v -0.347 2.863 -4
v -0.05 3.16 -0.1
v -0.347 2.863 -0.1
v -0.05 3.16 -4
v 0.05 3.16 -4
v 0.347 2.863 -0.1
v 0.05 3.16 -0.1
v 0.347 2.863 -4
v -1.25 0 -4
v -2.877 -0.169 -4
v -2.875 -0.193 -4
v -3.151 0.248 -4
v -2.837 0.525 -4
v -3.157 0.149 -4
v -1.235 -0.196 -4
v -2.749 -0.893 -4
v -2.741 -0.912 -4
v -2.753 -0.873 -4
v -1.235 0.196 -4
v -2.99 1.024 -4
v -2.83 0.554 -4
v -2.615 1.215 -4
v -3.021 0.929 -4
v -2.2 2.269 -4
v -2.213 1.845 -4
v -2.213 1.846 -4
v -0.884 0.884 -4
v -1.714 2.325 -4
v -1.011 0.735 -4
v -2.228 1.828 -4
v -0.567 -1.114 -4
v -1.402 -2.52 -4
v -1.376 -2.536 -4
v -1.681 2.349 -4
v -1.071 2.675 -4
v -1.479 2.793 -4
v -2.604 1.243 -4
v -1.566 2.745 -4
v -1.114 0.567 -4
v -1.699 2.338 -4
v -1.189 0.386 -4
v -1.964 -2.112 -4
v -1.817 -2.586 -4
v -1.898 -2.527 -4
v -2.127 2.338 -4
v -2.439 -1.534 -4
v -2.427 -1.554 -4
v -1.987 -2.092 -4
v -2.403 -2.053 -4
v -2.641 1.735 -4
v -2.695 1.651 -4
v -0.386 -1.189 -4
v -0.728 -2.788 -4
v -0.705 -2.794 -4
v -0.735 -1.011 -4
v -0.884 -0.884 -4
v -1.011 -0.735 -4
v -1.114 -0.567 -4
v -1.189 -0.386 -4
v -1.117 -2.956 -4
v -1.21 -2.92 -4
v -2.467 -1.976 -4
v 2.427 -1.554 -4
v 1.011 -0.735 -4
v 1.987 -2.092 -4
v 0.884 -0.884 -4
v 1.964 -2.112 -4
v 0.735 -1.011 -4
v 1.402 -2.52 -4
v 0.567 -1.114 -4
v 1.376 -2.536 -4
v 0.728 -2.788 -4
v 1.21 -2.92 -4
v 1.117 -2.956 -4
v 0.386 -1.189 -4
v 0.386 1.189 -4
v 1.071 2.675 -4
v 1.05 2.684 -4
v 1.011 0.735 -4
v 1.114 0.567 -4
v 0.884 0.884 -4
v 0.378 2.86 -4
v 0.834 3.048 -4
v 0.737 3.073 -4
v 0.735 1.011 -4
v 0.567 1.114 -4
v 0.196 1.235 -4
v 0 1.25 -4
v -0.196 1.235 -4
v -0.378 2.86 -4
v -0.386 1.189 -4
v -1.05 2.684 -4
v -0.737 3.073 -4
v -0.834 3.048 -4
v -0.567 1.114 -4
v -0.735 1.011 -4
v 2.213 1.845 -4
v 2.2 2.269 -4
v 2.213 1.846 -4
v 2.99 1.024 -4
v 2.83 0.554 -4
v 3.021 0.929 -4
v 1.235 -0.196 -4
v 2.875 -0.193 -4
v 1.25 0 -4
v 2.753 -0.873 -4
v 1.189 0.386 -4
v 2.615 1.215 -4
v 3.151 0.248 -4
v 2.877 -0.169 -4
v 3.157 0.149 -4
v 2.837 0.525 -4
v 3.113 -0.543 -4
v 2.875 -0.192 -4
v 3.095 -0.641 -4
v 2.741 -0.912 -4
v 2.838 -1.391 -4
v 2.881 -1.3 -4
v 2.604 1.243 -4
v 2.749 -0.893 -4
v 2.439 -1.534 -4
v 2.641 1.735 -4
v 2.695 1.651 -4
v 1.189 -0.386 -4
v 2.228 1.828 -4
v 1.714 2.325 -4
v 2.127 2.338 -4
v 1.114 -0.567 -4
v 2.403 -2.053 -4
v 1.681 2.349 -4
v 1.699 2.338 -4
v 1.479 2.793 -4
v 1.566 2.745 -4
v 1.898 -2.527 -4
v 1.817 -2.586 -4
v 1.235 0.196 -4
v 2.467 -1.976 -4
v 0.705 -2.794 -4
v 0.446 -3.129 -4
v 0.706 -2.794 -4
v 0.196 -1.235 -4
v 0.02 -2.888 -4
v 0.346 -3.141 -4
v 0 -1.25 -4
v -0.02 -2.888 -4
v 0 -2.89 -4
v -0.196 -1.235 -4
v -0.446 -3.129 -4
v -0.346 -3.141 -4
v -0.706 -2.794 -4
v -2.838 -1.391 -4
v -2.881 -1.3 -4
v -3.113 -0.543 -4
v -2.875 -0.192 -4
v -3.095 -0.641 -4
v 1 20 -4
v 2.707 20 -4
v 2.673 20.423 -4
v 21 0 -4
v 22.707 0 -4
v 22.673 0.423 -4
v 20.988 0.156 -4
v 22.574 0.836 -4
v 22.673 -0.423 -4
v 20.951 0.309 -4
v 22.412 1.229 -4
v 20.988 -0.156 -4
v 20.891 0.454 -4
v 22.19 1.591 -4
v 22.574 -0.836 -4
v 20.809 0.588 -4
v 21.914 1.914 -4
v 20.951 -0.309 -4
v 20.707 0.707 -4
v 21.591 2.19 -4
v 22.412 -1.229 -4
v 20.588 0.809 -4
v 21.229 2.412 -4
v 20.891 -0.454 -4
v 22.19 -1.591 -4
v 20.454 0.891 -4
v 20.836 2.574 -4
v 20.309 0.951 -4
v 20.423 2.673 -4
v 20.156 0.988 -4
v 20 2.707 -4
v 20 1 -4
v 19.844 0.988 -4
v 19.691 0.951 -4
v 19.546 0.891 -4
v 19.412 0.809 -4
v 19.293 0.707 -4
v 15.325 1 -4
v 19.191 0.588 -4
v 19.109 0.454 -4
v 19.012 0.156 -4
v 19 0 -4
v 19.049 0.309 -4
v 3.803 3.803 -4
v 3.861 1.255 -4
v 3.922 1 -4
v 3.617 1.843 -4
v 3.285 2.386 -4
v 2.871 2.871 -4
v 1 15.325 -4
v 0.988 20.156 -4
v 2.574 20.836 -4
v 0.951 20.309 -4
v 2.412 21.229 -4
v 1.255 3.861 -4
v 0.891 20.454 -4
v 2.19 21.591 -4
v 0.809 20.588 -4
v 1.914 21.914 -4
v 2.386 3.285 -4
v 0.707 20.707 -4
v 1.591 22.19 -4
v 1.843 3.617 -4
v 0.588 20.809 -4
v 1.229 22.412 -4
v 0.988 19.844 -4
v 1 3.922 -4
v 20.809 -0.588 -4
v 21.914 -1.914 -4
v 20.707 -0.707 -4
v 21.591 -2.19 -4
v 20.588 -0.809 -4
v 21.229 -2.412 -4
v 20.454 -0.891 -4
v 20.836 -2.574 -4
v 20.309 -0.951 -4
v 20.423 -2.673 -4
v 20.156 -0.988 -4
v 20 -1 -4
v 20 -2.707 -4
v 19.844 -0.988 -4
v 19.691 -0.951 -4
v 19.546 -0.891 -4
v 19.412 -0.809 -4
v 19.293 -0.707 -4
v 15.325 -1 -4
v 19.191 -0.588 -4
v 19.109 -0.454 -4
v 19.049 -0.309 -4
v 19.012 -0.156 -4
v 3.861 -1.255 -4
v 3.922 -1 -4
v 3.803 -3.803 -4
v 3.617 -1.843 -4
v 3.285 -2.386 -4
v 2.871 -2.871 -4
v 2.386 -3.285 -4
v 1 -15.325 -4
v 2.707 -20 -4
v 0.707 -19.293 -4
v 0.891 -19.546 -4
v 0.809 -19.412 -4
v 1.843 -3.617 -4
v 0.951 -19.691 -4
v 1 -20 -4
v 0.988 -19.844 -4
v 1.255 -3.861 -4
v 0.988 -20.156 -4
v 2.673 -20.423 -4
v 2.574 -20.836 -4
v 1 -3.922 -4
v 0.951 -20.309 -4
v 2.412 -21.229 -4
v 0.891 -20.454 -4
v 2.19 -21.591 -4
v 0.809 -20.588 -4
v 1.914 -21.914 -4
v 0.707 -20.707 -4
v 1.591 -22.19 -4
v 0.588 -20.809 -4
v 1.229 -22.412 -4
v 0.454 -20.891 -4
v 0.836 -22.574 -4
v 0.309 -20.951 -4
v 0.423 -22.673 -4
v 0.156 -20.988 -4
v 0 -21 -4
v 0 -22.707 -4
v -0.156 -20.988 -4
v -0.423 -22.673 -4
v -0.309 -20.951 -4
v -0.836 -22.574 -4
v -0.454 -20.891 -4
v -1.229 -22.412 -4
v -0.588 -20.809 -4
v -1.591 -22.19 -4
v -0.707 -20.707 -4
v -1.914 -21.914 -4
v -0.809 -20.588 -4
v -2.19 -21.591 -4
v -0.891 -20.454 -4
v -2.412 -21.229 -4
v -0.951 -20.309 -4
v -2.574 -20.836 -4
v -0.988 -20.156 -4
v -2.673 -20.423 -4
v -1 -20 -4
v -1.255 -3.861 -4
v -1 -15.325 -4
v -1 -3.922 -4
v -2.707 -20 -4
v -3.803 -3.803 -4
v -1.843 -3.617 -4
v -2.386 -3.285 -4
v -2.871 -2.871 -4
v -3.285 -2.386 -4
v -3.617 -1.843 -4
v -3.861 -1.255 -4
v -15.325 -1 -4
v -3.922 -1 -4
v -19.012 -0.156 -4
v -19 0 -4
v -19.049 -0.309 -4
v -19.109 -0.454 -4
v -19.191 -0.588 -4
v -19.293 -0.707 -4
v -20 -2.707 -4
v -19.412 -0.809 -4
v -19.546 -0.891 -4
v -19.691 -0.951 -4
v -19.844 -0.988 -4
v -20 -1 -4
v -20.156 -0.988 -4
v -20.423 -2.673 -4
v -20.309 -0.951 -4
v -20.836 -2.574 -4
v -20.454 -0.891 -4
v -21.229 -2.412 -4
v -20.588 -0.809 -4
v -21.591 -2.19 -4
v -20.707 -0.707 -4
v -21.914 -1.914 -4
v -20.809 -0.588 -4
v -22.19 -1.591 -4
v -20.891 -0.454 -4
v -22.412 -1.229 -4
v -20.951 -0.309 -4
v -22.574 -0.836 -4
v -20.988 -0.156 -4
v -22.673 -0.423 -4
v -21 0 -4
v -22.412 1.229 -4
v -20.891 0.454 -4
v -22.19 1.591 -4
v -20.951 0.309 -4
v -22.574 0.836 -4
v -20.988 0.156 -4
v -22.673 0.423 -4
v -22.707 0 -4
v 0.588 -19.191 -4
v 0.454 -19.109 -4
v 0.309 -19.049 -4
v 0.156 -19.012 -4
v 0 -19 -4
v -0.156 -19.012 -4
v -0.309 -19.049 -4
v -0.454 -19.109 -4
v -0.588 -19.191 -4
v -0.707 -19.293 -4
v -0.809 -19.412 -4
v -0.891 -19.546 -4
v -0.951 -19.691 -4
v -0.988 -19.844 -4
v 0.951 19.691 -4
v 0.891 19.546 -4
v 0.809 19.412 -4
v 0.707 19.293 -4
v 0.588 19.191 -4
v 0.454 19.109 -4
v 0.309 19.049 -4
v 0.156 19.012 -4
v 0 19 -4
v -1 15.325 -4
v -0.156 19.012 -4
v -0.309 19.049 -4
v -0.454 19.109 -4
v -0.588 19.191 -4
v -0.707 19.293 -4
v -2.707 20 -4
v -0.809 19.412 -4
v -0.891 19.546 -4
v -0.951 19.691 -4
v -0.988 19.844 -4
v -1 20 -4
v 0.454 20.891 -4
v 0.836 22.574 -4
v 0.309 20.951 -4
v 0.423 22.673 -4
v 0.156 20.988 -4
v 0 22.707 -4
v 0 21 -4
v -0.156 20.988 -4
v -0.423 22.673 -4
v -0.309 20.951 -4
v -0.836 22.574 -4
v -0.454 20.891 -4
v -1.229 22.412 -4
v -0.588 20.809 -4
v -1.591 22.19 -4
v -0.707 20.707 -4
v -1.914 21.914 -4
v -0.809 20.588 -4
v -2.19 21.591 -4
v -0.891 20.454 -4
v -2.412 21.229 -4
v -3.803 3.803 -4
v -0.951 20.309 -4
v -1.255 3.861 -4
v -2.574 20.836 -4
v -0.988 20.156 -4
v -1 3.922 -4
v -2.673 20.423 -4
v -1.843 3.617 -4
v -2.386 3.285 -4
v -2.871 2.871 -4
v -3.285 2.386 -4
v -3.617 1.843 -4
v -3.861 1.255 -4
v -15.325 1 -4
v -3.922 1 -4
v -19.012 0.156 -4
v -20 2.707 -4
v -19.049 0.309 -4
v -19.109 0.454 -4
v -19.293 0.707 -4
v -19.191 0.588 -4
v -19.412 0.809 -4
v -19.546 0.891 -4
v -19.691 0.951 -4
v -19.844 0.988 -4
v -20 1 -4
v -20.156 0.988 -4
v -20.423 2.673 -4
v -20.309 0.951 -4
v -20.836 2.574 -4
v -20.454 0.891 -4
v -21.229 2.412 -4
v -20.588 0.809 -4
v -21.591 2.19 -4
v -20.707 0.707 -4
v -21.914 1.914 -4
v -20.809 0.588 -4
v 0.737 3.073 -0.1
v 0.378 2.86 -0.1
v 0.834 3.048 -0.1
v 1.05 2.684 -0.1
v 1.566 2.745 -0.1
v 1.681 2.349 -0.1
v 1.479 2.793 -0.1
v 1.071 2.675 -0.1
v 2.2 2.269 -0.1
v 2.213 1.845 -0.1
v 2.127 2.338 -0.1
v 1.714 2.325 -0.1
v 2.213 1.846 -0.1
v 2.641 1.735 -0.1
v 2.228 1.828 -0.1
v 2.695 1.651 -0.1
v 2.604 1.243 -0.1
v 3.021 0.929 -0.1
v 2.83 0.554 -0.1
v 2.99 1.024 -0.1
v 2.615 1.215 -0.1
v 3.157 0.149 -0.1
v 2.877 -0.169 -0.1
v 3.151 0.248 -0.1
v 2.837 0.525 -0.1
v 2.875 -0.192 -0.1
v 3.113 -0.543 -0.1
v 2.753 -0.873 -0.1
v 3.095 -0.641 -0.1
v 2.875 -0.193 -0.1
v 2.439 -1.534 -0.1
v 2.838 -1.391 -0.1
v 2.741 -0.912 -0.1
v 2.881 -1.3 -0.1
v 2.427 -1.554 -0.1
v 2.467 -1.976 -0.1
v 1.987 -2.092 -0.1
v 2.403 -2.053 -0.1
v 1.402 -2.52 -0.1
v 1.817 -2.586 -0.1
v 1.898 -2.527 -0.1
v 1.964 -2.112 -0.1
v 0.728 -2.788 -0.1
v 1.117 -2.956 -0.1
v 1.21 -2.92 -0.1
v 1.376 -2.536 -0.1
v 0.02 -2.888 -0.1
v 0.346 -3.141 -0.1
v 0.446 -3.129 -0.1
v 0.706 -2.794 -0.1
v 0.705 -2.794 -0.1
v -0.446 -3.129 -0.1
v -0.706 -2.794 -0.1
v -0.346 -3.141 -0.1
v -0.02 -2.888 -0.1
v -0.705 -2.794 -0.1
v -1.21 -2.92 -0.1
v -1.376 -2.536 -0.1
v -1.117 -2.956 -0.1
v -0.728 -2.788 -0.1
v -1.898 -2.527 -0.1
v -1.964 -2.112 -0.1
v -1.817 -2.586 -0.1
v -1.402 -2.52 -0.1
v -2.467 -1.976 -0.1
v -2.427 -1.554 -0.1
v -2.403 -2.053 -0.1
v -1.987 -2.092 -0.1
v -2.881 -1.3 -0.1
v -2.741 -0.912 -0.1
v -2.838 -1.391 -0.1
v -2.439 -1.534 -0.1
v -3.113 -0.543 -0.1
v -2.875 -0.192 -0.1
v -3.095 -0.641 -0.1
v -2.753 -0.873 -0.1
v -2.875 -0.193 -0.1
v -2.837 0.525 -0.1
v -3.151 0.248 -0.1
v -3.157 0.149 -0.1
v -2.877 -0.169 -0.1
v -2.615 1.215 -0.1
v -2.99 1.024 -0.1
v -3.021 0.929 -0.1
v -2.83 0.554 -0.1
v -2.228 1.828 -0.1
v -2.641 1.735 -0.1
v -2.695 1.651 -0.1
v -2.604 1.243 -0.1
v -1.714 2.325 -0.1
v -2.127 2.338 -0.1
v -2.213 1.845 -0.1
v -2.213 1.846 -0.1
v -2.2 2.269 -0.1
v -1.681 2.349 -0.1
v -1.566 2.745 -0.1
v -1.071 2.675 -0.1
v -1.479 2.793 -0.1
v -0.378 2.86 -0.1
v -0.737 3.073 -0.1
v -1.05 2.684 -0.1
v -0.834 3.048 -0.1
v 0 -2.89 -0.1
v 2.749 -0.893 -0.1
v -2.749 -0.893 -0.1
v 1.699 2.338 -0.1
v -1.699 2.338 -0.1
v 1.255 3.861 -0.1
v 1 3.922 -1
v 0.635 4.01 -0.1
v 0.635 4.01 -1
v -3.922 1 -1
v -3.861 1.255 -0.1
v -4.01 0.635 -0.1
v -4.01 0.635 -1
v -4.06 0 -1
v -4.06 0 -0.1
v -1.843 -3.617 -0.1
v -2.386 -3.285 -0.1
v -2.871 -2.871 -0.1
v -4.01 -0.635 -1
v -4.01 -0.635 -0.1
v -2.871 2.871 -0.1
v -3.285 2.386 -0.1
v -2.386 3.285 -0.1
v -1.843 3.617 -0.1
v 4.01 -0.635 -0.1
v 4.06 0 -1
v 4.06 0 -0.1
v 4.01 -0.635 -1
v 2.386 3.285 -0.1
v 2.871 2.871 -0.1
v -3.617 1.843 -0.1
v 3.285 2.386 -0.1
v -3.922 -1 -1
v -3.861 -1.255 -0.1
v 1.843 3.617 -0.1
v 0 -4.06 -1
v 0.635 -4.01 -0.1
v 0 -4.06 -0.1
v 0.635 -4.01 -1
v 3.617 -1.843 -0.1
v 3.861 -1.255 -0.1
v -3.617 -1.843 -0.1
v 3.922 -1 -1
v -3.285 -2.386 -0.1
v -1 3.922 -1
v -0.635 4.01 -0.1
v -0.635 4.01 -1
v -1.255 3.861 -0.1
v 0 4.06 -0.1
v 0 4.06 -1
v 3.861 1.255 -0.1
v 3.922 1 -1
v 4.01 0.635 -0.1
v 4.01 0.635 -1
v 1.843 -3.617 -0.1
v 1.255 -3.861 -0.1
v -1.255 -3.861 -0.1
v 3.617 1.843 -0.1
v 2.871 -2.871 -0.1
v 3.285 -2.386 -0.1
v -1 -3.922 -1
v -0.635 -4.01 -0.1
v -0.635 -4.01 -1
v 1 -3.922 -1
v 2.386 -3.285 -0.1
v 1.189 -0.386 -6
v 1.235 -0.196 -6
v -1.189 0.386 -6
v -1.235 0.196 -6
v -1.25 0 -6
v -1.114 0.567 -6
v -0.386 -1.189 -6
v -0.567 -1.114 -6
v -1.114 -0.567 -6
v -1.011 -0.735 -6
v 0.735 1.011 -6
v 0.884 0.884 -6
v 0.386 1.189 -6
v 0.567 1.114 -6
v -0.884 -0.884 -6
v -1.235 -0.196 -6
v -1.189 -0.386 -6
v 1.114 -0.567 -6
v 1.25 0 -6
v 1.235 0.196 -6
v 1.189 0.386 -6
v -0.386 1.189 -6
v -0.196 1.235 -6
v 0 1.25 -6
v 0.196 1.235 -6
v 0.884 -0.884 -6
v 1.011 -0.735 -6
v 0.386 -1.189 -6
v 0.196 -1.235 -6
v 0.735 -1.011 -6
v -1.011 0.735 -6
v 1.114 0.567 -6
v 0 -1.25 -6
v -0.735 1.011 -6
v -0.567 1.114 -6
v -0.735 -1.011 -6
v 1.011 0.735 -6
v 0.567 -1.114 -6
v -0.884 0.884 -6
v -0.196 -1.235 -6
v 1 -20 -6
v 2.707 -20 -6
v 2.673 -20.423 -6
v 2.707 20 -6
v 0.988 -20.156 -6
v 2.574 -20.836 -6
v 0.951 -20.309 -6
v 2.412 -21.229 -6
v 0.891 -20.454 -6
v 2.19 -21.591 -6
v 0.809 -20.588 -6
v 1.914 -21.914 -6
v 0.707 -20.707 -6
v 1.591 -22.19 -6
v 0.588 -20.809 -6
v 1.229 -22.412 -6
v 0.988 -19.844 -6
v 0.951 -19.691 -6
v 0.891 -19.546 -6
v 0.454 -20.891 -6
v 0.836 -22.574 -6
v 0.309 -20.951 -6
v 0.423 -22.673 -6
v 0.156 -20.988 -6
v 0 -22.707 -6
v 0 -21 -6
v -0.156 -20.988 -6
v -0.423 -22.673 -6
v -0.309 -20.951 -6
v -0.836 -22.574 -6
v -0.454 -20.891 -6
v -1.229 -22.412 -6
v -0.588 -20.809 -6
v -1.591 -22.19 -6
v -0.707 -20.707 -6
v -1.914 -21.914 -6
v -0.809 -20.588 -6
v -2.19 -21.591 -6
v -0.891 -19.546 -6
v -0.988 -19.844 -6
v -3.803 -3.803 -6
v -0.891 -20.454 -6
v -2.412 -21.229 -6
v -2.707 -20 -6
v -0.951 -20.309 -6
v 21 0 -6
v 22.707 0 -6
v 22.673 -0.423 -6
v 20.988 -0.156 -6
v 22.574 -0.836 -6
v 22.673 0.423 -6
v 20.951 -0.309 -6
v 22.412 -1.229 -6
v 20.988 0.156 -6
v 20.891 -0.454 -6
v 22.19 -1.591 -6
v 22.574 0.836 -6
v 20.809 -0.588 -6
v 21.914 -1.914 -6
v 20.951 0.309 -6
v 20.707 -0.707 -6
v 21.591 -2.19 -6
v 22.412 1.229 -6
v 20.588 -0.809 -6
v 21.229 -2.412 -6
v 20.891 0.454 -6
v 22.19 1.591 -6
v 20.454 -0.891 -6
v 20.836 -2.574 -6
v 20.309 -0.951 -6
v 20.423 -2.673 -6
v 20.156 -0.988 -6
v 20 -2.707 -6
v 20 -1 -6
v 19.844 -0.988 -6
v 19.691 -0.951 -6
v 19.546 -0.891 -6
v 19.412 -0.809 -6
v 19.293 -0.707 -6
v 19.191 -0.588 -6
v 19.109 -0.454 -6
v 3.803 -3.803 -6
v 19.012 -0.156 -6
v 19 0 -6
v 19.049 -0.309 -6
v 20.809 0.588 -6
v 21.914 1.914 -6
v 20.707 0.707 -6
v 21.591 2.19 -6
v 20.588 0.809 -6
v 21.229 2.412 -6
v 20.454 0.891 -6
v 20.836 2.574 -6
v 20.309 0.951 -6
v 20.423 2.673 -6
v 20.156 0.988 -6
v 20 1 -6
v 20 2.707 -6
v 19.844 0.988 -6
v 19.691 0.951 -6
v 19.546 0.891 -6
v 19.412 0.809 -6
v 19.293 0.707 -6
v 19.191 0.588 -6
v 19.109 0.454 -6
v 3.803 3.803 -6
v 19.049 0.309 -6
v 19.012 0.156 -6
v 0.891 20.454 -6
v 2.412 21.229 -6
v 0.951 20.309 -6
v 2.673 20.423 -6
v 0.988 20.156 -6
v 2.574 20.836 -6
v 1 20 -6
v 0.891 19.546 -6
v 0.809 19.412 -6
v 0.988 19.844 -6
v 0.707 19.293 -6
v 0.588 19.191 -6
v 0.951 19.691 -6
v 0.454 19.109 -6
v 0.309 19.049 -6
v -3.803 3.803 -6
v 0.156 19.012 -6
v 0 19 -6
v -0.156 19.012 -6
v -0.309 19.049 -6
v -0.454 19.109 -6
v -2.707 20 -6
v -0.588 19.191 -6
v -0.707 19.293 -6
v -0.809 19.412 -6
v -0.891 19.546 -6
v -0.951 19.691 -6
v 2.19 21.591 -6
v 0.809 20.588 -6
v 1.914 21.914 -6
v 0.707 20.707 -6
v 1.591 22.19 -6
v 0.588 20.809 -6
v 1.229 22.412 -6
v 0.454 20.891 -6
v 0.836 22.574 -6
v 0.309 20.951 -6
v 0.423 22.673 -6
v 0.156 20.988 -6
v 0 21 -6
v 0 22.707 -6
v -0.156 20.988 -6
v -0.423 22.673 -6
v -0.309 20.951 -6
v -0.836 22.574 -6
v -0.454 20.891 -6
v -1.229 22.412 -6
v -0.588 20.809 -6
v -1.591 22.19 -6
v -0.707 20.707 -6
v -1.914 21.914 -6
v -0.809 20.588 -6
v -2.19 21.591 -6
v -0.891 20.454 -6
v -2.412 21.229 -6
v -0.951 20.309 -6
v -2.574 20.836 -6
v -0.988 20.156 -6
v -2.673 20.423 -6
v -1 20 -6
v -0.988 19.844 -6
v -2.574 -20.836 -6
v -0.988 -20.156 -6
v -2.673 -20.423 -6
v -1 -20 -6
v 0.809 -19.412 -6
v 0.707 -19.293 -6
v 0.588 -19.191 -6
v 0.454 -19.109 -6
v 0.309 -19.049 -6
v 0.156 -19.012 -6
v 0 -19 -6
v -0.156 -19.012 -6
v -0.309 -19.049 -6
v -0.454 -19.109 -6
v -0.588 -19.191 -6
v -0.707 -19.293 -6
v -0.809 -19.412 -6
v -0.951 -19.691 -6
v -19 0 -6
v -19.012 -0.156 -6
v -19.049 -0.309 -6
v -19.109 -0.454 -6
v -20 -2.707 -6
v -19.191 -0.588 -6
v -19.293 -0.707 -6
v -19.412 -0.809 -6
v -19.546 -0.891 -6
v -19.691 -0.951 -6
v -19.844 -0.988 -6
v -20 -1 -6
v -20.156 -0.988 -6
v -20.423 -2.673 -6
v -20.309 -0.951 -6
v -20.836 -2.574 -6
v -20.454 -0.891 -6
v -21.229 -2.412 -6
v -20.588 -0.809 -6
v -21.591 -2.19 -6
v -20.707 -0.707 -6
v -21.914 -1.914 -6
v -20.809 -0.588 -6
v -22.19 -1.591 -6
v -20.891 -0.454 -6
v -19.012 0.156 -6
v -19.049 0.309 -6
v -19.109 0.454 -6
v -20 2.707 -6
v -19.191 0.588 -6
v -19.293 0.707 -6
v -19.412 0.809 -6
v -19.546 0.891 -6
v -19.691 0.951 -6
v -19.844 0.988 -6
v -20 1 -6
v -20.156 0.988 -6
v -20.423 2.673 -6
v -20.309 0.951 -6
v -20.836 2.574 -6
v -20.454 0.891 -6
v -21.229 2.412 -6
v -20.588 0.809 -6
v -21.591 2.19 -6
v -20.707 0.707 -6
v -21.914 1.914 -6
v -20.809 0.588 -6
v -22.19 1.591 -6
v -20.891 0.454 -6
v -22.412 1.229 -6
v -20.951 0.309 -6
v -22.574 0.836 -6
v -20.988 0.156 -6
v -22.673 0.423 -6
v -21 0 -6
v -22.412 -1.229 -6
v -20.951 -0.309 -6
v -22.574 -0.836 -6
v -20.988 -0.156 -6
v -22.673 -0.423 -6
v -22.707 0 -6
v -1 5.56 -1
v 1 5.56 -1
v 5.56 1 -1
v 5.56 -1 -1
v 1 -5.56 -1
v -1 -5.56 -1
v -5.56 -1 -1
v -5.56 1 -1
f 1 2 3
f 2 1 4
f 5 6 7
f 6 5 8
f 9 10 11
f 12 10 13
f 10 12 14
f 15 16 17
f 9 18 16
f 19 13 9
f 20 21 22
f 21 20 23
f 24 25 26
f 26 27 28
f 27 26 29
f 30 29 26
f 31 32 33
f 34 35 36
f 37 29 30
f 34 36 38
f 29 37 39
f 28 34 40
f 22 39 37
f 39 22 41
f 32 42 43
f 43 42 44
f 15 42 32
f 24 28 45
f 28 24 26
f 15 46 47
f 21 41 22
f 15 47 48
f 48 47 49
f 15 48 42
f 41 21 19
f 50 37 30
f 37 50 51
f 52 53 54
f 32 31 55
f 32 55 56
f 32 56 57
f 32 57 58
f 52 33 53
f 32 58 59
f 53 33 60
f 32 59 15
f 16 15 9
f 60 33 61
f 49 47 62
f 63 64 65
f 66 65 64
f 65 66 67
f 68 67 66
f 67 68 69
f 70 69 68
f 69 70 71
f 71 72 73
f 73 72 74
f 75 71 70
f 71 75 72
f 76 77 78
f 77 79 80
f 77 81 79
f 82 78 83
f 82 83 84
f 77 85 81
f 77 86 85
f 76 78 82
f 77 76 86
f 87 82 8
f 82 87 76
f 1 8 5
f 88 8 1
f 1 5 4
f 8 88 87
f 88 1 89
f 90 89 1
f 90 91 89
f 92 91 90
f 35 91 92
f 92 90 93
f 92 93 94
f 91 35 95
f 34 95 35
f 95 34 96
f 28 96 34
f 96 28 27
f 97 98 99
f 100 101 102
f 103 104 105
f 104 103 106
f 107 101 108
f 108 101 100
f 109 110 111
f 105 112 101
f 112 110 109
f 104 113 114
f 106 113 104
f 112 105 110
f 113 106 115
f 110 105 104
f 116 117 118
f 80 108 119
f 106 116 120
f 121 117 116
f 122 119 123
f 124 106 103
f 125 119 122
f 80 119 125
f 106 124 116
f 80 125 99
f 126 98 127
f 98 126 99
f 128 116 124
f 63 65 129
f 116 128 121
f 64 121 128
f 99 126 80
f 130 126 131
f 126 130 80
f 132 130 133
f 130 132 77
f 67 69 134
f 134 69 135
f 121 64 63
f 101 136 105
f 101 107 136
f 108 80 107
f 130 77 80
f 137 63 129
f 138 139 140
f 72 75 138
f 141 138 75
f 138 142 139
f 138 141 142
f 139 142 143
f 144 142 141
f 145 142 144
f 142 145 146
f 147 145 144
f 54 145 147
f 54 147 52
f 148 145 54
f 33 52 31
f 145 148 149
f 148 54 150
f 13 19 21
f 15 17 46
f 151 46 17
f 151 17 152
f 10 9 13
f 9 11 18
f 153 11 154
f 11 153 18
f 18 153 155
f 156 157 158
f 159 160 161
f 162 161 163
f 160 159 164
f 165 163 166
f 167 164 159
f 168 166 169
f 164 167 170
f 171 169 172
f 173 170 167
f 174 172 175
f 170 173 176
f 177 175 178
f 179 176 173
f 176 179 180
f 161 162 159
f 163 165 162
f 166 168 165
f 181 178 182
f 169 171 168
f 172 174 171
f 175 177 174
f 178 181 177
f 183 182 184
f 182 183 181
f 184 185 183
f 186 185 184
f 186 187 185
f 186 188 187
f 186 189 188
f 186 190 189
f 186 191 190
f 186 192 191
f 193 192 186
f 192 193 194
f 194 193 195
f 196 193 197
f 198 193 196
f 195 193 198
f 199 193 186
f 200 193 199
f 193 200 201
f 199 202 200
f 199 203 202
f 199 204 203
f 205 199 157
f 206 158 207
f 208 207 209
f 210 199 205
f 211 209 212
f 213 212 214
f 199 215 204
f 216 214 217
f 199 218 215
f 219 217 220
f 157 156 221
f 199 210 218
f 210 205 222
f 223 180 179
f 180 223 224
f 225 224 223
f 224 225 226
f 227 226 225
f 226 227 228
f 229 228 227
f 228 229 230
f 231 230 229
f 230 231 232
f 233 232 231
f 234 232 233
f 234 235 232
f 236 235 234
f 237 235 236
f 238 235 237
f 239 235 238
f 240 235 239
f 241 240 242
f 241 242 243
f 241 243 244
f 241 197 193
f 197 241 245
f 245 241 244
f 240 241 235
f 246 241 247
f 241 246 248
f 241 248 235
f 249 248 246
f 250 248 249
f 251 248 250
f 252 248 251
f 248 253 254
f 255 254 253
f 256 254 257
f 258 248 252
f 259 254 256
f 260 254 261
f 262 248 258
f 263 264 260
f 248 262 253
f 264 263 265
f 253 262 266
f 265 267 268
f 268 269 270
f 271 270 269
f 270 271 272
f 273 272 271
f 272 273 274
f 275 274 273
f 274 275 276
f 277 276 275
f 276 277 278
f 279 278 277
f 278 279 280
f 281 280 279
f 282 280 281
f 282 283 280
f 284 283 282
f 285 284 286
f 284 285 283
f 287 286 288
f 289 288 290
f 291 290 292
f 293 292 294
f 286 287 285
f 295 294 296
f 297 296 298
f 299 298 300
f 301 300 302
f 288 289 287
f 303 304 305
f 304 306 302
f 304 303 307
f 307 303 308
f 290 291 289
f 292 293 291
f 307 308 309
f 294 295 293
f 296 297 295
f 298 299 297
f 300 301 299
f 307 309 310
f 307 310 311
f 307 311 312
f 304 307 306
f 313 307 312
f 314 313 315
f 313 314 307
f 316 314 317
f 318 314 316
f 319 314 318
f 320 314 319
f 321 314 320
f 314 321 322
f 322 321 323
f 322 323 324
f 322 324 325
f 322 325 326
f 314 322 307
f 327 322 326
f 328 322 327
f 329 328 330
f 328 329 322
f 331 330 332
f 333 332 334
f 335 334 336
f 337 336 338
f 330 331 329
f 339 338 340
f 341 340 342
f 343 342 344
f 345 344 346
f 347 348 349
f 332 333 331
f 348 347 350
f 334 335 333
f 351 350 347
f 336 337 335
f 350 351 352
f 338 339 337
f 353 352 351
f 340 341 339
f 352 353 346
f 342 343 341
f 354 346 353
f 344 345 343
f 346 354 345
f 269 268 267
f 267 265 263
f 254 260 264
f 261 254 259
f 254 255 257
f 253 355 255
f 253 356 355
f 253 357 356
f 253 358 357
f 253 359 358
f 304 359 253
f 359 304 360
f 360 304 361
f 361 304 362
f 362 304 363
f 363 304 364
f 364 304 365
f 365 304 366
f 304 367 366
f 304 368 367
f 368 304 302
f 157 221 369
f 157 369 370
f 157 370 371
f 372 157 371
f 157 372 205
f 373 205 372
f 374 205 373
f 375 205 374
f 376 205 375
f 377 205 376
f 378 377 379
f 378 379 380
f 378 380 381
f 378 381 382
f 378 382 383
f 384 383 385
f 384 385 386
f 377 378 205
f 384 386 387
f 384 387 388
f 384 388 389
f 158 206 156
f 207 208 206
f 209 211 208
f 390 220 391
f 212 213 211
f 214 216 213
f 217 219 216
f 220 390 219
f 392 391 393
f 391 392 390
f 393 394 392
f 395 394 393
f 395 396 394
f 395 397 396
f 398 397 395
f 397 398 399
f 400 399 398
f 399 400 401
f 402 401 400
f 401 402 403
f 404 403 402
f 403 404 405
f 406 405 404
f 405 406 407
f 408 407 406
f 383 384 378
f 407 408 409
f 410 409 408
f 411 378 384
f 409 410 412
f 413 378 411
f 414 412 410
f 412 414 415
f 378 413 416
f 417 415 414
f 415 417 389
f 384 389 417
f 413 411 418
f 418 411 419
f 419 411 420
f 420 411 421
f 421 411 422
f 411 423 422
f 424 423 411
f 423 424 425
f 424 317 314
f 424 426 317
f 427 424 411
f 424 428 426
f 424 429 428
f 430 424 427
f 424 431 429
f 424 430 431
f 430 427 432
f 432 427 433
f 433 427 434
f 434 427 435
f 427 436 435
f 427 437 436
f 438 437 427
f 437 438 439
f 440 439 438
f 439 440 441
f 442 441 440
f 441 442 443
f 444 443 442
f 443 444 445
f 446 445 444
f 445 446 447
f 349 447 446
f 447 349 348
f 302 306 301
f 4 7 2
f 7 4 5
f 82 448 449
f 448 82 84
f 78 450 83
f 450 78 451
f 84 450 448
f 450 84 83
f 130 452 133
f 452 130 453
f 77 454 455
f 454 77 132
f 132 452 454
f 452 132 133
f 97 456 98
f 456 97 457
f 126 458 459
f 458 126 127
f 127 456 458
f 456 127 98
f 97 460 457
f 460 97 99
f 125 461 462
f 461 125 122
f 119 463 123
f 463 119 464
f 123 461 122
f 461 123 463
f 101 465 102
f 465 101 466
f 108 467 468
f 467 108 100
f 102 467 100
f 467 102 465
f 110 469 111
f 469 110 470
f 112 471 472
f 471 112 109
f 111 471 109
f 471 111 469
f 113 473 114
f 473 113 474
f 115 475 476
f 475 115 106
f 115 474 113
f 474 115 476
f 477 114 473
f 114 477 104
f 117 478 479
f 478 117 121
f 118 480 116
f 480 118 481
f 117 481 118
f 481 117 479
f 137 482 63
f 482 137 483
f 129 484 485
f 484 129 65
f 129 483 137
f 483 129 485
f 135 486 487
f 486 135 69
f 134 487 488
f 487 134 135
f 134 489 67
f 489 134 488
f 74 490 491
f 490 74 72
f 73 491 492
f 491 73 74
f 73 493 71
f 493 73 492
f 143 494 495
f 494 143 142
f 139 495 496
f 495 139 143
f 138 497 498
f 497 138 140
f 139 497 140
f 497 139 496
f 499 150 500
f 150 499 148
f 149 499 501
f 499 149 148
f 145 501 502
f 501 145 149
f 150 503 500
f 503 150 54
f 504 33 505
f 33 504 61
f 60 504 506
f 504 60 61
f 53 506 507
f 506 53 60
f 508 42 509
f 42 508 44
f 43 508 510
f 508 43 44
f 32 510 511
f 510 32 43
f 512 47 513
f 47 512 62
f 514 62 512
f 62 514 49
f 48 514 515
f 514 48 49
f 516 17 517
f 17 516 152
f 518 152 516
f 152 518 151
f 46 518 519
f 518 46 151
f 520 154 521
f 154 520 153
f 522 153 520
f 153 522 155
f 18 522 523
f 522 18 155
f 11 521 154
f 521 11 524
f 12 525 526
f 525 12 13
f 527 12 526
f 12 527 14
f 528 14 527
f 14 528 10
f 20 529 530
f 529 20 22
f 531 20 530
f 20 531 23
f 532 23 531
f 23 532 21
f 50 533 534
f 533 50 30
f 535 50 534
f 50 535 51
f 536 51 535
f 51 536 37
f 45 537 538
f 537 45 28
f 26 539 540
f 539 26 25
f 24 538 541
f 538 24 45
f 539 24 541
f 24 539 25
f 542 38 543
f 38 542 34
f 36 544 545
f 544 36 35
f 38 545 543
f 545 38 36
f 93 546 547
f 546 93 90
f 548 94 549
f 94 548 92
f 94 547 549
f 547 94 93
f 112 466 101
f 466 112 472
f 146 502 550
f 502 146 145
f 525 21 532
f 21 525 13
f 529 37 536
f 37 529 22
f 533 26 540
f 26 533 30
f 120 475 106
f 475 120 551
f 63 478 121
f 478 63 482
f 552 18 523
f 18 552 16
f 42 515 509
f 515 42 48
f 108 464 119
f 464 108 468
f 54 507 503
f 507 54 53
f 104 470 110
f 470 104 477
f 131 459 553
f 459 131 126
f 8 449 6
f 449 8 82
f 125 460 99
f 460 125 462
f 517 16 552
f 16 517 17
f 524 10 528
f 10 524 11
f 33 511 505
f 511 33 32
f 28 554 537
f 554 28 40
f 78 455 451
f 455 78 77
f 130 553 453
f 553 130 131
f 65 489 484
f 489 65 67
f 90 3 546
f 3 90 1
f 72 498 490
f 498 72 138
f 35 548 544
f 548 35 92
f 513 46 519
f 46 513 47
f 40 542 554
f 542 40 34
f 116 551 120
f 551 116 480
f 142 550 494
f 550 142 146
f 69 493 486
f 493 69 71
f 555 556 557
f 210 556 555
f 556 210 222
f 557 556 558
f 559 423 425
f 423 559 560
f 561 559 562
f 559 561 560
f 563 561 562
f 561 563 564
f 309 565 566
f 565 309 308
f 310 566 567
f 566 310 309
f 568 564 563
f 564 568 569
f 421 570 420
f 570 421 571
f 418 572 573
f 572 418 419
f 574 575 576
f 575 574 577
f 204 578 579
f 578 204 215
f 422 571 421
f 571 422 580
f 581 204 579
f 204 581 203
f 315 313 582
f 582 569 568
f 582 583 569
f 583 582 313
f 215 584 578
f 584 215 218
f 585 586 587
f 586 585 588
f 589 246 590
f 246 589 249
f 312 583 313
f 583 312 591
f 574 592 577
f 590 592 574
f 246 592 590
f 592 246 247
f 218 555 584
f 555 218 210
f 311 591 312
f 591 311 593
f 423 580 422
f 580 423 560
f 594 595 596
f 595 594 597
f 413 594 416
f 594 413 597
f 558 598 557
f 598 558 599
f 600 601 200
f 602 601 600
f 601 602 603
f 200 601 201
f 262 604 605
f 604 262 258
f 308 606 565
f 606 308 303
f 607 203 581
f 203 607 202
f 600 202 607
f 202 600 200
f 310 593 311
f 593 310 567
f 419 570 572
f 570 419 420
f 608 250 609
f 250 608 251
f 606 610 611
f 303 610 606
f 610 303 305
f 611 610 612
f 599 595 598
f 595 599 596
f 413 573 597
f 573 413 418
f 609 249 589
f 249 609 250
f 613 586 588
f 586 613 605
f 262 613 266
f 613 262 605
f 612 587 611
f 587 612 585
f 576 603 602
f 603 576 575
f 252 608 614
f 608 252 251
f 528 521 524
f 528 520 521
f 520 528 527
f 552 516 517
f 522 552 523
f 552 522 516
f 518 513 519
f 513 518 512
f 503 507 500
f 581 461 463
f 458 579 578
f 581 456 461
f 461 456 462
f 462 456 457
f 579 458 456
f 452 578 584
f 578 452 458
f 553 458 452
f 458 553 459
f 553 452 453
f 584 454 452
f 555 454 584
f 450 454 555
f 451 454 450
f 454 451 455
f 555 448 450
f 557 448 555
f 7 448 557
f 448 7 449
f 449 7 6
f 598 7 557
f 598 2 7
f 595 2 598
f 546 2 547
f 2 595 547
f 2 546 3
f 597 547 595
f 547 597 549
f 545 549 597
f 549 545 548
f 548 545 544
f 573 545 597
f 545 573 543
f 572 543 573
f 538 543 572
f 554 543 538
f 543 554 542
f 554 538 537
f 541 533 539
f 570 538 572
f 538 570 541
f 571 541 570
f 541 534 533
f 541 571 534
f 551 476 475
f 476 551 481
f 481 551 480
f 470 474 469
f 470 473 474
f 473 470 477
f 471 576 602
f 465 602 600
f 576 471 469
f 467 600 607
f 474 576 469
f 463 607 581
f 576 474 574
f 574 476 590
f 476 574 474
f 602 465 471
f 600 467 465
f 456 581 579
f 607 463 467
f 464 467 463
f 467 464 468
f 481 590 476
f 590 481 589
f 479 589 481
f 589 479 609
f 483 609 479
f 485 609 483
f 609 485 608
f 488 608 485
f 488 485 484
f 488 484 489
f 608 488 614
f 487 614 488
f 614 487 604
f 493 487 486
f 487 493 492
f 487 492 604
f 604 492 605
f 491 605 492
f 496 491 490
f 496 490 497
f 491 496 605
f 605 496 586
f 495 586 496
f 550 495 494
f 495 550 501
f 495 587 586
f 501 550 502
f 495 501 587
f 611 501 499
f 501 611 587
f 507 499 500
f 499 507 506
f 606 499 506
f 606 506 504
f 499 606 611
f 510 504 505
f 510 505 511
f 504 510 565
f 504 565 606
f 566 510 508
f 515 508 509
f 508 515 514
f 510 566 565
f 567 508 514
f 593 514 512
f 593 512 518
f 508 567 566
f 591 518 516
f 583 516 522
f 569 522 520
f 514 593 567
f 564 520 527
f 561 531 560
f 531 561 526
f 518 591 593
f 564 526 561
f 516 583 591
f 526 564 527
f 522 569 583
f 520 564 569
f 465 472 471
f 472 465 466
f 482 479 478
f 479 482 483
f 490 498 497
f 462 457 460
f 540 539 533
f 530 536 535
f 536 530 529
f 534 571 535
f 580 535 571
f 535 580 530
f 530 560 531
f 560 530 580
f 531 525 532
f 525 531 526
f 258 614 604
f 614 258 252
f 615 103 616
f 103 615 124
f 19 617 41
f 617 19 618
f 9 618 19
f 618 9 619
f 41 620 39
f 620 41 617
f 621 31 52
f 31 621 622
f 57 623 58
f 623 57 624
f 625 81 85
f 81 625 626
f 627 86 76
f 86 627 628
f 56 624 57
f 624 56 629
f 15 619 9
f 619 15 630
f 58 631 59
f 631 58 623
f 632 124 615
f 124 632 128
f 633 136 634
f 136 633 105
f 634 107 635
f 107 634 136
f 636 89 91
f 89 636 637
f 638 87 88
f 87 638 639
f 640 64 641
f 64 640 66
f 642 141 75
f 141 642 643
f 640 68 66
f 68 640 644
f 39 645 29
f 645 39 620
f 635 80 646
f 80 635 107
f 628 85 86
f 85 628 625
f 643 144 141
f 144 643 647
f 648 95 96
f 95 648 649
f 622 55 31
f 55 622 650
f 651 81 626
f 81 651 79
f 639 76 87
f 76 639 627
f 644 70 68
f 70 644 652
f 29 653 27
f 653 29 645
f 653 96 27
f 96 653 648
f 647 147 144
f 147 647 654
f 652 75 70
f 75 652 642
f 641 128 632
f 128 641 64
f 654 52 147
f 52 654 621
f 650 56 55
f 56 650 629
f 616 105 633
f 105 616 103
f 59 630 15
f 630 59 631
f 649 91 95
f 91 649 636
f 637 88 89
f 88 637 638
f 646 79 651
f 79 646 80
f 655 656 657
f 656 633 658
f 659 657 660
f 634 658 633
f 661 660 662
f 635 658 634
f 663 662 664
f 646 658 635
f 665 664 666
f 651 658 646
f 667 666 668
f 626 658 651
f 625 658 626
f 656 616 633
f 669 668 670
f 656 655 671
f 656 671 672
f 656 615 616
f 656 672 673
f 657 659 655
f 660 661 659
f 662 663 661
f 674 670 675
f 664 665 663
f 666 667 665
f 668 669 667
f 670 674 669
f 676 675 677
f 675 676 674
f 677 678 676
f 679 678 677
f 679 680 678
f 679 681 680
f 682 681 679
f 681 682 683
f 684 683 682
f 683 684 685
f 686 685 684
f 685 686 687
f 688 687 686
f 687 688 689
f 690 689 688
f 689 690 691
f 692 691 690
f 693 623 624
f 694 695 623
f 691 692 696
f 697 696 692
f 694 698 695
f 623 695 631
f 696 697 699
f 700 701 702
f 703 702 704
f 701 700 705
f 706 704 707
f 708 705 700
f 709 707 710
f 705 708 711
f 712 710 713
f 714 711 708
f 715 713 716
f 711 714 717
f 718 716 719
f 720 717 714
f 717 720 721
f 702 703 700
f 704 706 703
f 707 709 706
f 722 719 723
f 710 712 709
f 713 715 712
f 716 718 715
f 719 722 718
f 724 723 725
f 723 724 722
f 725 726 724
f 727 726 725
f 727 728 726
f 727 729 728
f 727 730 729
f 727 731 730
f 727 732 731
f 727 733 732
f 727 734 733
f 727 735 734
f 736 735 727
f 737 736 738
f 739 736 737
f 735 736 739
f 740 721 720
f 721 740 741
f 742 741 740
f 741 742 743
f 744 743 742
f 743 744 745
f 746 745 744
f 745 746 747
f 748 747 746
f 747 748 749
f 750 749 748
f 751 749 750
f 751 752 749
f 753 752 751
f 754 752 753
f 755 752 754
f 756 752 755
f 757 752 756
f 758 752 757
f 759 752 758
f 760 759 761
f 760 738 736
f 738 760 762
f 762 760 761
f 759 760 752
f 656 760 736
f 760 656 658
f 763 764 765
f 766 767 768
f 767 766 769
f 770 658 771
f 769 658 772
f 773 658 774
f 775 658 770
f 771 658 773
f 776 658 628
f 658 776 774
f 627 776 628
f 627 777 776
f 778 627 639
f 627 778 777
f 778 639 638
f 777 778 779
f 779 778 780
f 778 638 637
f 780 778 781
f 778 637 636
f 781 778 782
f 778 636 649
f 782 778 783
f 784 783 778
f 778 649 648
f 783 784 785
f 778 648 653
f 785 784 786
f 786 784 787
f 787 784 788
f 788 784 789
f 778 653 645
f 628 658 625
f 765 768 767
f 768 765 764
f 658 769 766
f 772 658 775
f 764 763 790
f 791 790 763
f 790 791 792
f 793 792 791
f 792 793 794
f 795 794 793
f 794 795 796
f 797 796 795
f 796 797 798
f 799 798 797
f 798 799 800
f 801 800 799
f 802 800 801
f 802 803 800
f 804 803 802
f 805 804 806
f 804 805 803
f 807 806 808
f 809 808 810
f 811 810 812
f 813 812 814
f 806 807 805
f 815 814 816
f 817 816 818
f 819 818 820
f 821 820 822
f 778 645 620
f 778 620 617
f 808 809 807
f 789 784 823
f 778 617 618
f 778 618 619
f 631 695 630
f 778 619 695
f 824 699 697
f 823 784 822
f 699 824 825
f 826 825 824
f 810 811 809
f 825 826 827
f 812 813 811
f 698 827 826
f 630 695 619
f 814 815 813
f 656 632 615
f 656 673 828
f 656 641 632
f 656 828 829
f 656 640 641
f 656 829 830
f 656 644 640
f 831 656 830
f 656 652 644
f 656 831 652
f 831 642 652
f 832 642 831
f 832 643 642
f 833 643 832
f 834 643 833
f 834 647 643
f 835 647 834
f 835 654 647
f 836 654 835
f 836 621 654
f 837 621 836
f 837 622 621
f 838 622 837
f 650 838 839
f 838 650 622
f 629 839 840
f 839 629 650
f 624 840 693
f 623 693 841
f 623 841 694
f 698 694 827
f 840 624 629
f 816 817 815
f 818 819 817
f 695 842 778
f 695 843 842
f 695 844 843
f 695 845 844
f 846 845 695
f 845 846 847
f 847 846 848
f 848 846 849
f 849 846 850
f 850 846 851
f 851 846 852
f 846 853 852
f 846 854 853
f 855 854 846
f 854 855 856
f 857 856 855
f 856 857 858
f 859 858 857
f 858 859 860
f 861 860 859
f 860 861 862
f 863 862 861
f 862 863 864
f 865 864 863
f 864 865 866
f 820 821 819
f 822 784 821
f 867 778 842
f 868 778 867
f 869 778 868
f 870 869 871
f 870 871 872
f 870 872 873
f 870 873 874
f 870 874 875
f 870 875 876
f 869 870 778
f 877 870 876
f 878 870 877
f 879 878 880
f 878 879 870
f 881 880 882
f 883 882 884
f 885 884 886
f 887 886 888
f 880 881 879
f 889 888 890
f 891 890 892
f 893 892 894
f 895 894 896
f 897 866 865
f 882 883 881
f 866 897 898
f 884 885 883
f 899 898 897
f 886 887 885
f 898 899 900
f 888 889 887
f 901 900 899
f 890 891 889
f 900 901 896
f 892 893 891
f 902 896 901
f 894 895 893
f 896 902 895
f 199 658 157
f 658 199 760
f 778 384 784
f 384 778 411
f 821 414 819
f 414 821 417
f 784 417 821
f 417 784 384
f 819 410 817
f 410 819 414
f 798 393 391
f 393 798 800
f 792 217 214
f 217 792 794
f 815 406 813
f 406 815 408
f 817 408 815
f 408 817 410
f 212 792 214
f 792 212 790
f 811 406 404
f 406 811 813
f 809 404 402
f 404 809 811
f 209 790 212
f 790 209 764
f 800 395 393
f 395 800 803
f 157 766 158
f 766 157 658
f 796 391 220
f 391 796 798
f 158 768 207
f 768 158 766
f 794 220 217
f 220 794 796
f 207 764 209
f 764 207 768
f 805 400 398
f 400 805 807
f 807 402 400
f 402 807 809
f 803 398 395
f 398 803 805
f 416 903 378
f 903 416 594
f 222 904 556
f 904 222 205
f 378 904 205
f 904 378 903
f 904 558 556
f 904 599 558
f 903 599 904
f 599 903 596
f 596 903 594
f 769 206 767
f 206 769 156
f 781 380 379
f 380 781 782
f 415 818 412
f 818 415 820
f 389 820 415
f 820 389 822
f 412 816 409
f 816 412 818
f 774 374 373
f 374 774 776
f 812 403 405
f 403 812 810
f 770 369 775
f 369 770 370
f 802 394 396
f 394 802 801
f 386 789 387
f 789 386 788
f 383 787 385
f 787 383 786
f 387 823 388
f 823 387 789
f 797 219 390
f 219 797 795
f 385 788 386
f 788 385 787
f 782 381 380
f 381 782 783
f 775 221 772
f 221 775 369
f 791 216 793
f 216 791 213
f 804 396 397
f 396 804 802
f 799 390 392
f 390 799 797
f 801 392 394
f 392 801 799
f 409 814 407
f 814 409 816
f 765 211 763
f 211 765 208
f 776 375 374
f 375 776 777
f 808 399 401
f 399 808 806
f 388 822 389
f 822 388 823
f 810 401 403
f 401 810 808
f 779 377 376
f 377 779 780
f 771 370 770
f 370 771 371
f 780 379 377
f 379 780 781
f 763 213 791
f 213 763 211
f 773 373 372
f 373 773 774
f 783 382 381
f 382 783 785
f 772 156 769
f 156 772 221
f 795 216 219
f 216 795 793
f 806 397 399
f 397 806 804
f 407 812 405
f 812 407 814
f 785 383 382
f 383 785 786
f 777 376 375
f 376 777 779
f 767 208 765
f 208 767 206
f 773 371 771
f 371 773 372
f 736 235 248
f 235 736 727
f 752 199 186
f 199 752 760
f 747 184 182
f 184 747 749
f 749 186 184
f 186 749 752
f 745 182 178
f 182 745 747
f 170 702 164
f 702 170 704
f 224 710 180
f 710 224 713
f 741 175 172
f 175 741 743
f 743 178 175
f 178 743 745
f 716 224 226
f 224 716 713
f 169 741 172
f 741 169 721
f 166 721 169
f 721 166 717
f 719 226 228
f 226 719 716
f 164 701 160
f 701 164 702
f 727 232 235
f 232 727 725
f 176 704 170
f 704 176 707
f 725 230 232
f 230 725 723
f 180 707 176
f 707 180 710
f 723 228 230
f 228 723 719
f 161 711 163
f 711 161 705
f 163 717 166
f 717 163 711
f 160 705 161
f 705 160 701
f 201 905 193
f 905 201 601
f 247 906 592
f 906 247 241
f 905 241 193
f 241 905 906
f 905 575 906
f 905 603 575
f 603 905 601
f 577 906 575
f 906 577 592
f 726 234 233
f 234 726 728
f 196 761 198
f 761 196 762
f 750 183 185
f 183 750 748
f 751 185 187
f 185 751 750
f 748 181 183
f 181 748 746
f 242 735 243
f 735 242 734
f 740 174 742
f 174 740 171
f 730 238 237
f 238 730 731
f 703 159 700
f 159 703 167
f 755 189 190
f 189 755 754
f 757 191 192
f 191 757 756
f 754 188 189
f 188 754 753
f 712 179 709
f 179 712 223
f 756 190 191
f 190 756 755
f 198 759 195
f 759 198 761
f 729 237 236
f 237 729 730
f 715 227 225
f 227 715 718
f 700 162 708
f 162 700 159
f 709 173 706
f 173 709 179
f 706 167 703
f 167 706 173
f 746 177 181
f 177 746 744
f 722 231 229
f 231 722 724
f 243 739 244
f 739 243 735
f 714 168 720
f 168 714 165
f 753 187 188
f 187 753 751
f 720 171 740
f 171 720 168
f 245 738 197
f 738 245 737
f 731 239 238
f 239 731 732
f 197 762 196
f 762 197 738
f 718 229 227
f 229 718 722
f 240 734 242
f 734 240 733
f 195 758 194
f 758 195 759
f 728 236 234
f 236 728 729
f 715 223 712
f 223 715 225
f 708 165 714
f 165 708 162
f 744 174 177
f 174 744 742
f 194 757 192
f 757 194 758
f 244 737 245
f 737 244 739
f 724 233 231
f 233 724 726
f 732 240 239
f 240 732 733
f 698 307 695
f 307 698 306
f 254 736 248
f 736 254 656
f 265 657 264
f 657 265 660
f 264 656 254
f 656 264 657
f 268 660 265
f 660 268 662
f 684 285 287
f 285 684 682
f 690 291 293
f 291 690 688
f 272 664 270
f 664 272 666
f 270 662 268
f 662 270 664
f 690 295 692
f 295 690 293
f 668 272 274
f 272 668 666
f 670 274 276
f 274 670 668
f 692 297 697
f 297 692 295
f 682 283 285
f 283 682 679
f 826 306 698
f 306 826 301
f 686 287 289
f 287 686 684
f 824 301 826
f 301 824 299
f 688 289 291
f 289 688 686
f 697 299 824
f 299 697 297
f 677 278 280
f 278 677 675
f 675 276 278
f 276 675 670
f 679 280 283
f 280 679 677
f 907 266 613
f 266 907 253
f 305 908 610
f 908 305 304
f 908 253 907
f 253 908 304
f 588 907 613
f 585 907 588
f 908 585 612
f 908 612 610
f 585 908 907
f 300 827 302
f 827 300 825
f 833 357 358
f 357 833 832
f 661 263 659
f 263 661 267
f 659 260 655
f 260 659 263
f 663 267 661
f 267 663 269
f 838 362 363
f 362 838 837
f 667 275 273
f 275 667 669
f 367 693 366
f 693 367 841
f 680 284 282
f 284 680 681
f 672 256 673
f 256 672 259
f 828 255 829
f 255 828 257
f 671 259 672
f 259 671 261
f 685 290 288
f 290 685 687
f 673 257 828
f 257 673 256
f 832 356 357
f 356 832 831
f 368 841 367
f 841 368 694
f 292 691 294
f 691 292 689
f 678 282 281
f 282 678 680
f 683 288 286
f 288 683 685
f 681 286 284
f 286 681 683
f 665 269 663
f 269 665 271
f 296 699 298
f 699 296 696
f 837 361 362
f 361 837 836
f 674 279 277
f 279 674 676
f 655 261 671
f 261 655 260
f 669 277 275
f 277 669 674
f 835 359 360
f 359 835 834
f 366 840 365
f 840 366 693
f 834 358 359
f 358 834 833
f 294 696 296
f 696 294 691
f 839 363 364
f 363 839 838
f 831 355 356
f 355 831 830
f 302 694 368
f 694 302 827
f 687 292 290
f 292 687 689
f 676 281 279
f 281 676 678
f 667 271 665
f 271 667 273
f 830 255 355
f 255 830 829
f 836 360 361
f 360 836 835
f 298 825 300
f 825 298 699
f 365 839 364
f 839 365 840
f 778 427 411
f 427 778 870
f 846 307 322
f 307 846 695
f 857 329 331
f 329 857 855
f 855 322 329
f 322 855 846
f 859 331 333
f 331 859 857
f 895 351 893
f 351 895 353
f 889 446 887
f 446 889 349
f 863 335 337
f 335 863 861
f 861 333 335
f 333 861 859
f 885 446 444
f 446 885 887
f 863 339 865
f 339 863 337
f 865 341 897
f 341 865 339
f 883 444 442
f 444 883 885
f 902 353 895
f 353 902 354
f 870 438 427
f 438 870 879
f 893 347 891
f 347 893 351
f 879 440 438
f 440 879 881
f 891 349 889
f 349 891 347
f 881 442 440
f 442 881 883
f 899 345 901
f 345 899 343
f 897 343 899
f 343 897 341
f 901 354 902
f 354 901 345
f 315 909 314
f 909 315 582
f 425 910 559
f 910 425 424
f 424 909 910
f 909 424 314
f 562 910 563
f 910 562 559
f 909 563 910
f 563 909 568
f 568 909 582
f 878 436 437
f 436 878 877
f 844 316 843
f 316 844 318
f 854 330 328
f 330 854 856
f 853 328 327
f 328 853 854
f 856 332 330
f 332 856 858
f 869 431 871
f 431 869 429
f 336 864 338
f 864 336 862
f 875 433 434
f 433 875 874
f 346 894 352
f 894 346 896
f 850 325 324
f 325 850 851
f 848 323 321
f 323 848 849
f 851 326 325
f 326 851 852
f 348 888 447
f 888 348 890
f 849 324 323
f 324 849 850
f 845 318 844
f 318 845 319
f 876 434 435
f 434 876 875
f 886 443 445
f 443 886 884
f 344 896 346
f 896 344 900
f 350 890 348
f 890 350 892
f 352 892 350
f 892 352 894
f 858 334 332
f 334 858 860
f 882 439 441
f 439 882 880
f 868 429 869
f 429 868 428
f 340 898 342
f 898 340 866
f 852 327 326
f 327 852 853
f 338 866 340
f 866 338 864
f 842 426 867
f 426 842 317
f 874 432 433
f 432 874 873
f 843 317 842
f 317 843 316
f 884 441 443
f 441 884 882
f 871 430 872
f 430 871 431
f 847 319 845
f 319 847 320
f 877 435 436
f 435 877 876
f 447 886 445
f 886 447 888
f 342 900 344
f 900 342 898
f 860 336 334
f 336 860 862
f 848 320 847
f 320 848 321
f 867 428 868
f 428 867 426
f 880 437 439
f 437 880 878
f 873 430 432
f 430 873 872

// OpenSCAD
/**
 *  Parametric servo arm generator for OpenScad
 *  Générateur de palonnier de servo pour OpenScad
 *
 *  Copyright (c) 2012 Charles Rincheval.  All rights reserved.
 *
 *  This library is free software; you can redistribute it and/or
 *  modify it under the terms of the GNU Lesser General Public
 *  License as published by the Free Software Foundation; either
 *  version 2.1 of the License, or (at your option) any later version.
 *
 *  This library is distributed in the hope that it will be useful,
 *  but WITHOUT ANY WARRANTY; without even the implied warranty of
 *  MERCHANTABILITY or FITNESS FOR A PARTICULAR PURPOSE.  See the GNU
 *  Lesser General Public License for more details.
 *
 *  You should have received a copy of the GNU Lesser General Public
 *  License along with this library; if not, write to the Free Software
 *  Foundation, Inc., 51 Franklin St, Fifth Floor, Boston, MA  02110-1301  USA
 *
 *  Last update :
 *  https://github.com/hugokernel/OpenSCAD_ServoArms
 *
 *  http://www.digitalspirit.org/
 */

$fn = 40;

/**
 *  Clear between arm head and servo head
 *  With PLA material, use clear : 0.3, for ABS, use 0.2
 */
SERVO_HEAD_CLEAR = 0.2;

/**
 *  Head / Tooth parameters
 *  Futaba 3F Standard Spline
 *  http://www.servocity.com/html/futaba_servo_splines.html
 *
 *  First array (head related) :
 *  0. Head external diameter
 *  1. Head heigth
 *  2. Head thickness
 *  3. Head screw diameter
 *
 *  Second array (tooth related) :
 *  0. Tooth count
 *  1. Tooth height
 *  2. Tooth length
 *  3. Tooth width
 */
FUTABA_3F_SPLINE = [
    [5.92, 4, 1.1, 2.5],
    [25, 0.3, 0.7, 0.1]
];

module servo_futaba_3f(length, count) {
    servo_arm(FUTABA_3F_SPLINE, [length, count]);
}

/**
 *  If you want to support a new servo, juste add a new spline definition array
 *  and a module named like servo_XXX_YYY where XXX is servo brand and YYY is the
 *  connection type (3f) or the servo type (s3003)
 */

module servo_standard(length, count) {
    servo_futaba_3f(length, count);
}

/**
 *  Tooth
 *
 *    |<-w->|
 *    |_____|___
 *    /     \  ^h
 *  _/       \_v
 *   |<--l-->|
 *
 *  - tooth length (l)
 *  - tooth width (w)
 *  - tooth height (h)
 *  - height
 *
 */
module servo_head_tooth(length, width, height, head_height) {
    linear_extrude(height = head_height) {
        polygon([[-length / 2, 0], [-width / 2, height], [width / 2, height], [length / 2,0]]);
    }
}

/**
 *  Servo head
 */
module servo_head(params, clear = SERVO_HEAD_CLEAR) {

    head = params[0];
    tooth = params[1];

    head_diameter = head[0];
    head_height = head[1];
    //head_heigth

    tooth_count = tooth[0];
    tooth_height = tooth[1];
    tooth_length = tooth[2];
    tooth_width = tooth[3];

    /* % cylinder(r = head_diameter / 2, h = head_height + 1); */

    cylinder(r = head_diameter / 2 - tooth_height + 0.03 + clear, h = head_height);

    for (i = [0 : tooth_count]) {
        rotate([0, 0, i * (360 / tooth_count)]) {
            translate([0, head_diameter / 2 - tooth_height + clear, 0]) {
                servo_head_tooth(tooth_length, tooth_width, tooth_height, head_height);
            }
        }
    }
}

/**
 *  Servo hold
 *  - Head / Tooth parameters
 *  - Arms params (length and count)
 */
module servo_arm(params, arms) {

    head = params[0];
    tooth = params[1];

    head_diameter = head[0];
    head_height = head[1];
    head_thickness = head[2];
    head_screw_diameter = head[3];

    tooth_length = tooth[2];
    tooth_width = tooth[3];

    arm_length = arms[0];
    arm_count = arms[1];

    /**
     *  Servo arm
     *  - length is from center to last hole
     */
    module arm(tooth_length, tooth_width, reinforcement_height, head_height, hole_count = 1) {
        arm_screw_diameter = 2;

        difference() {
            union() {
                cylinder(r = tooth_width / 2, h = head_height);

                linear_extrude(height = head_height) {
                    polygon([
                        [-tooth_width / 2, 0], [-tooth_width / 3, tooth_length],
                        [tooth_width / 3, tooth_length], [tooth_width / 2, 0]
                    ]);
                }

                translate([0, tooth_length, 0]) {
                    cylinder(r = tooth_width / 3, h = head_height);
                }

                if (tooth_length >= 12) {
                    translate([-head_height / 2 + 2, head_diameter / 2 + head_thickness - 0.5, -4]) {
                        rotate([90, 0, 0]) {
                            rotate([0, -90, 0]) {
                                linear_extrude(height = head_height) {
                                    polygon([
                                        [-tooth_length / 1.7, 4], [0, 4], [0, - reinforcement_height + 5],
                                        [-2, - reinforcement_height + 5]
                                    ]);
                                }
                            }
                        }
                    }
                }
            }

            // Hole
            for (i = [0 : hole_count - 1]) {
                //translate([0, length - (length / hole_count * i), -1]) {
                translate([0, tooth_length - (4 * i), -1]) {
                    cylinder(r = arm_screw_diameter / 2, h = 10);
                }
            }

            cylinder(r = head_screw_diameter / 2, h = 10);
        }
    }

    difference() {
        translate([0, 0, 0.1]) {
            cylinder(r = head_diameter / 2 + head_thickness, h = head_height + 1);
        }

        cylinder(r = head_screw_diameter / 2, h = 10);

        servo_head(params);
    }

    arm_thickness = head_thickness;

    // Arm
    translate([0, 0, head_height]) {
        for (i = [0 : arm_count - 1]) {
            rotate([0, 0, i * (360 / arm_count)]) {
                arm(arm_length, head_diameter + arm_thickness * 2, head_height, 2);
            }
        }
    }
}

module demo() {
    rotate([0, 180, 0])
        servo_standard(20, 4);
}

demo();
